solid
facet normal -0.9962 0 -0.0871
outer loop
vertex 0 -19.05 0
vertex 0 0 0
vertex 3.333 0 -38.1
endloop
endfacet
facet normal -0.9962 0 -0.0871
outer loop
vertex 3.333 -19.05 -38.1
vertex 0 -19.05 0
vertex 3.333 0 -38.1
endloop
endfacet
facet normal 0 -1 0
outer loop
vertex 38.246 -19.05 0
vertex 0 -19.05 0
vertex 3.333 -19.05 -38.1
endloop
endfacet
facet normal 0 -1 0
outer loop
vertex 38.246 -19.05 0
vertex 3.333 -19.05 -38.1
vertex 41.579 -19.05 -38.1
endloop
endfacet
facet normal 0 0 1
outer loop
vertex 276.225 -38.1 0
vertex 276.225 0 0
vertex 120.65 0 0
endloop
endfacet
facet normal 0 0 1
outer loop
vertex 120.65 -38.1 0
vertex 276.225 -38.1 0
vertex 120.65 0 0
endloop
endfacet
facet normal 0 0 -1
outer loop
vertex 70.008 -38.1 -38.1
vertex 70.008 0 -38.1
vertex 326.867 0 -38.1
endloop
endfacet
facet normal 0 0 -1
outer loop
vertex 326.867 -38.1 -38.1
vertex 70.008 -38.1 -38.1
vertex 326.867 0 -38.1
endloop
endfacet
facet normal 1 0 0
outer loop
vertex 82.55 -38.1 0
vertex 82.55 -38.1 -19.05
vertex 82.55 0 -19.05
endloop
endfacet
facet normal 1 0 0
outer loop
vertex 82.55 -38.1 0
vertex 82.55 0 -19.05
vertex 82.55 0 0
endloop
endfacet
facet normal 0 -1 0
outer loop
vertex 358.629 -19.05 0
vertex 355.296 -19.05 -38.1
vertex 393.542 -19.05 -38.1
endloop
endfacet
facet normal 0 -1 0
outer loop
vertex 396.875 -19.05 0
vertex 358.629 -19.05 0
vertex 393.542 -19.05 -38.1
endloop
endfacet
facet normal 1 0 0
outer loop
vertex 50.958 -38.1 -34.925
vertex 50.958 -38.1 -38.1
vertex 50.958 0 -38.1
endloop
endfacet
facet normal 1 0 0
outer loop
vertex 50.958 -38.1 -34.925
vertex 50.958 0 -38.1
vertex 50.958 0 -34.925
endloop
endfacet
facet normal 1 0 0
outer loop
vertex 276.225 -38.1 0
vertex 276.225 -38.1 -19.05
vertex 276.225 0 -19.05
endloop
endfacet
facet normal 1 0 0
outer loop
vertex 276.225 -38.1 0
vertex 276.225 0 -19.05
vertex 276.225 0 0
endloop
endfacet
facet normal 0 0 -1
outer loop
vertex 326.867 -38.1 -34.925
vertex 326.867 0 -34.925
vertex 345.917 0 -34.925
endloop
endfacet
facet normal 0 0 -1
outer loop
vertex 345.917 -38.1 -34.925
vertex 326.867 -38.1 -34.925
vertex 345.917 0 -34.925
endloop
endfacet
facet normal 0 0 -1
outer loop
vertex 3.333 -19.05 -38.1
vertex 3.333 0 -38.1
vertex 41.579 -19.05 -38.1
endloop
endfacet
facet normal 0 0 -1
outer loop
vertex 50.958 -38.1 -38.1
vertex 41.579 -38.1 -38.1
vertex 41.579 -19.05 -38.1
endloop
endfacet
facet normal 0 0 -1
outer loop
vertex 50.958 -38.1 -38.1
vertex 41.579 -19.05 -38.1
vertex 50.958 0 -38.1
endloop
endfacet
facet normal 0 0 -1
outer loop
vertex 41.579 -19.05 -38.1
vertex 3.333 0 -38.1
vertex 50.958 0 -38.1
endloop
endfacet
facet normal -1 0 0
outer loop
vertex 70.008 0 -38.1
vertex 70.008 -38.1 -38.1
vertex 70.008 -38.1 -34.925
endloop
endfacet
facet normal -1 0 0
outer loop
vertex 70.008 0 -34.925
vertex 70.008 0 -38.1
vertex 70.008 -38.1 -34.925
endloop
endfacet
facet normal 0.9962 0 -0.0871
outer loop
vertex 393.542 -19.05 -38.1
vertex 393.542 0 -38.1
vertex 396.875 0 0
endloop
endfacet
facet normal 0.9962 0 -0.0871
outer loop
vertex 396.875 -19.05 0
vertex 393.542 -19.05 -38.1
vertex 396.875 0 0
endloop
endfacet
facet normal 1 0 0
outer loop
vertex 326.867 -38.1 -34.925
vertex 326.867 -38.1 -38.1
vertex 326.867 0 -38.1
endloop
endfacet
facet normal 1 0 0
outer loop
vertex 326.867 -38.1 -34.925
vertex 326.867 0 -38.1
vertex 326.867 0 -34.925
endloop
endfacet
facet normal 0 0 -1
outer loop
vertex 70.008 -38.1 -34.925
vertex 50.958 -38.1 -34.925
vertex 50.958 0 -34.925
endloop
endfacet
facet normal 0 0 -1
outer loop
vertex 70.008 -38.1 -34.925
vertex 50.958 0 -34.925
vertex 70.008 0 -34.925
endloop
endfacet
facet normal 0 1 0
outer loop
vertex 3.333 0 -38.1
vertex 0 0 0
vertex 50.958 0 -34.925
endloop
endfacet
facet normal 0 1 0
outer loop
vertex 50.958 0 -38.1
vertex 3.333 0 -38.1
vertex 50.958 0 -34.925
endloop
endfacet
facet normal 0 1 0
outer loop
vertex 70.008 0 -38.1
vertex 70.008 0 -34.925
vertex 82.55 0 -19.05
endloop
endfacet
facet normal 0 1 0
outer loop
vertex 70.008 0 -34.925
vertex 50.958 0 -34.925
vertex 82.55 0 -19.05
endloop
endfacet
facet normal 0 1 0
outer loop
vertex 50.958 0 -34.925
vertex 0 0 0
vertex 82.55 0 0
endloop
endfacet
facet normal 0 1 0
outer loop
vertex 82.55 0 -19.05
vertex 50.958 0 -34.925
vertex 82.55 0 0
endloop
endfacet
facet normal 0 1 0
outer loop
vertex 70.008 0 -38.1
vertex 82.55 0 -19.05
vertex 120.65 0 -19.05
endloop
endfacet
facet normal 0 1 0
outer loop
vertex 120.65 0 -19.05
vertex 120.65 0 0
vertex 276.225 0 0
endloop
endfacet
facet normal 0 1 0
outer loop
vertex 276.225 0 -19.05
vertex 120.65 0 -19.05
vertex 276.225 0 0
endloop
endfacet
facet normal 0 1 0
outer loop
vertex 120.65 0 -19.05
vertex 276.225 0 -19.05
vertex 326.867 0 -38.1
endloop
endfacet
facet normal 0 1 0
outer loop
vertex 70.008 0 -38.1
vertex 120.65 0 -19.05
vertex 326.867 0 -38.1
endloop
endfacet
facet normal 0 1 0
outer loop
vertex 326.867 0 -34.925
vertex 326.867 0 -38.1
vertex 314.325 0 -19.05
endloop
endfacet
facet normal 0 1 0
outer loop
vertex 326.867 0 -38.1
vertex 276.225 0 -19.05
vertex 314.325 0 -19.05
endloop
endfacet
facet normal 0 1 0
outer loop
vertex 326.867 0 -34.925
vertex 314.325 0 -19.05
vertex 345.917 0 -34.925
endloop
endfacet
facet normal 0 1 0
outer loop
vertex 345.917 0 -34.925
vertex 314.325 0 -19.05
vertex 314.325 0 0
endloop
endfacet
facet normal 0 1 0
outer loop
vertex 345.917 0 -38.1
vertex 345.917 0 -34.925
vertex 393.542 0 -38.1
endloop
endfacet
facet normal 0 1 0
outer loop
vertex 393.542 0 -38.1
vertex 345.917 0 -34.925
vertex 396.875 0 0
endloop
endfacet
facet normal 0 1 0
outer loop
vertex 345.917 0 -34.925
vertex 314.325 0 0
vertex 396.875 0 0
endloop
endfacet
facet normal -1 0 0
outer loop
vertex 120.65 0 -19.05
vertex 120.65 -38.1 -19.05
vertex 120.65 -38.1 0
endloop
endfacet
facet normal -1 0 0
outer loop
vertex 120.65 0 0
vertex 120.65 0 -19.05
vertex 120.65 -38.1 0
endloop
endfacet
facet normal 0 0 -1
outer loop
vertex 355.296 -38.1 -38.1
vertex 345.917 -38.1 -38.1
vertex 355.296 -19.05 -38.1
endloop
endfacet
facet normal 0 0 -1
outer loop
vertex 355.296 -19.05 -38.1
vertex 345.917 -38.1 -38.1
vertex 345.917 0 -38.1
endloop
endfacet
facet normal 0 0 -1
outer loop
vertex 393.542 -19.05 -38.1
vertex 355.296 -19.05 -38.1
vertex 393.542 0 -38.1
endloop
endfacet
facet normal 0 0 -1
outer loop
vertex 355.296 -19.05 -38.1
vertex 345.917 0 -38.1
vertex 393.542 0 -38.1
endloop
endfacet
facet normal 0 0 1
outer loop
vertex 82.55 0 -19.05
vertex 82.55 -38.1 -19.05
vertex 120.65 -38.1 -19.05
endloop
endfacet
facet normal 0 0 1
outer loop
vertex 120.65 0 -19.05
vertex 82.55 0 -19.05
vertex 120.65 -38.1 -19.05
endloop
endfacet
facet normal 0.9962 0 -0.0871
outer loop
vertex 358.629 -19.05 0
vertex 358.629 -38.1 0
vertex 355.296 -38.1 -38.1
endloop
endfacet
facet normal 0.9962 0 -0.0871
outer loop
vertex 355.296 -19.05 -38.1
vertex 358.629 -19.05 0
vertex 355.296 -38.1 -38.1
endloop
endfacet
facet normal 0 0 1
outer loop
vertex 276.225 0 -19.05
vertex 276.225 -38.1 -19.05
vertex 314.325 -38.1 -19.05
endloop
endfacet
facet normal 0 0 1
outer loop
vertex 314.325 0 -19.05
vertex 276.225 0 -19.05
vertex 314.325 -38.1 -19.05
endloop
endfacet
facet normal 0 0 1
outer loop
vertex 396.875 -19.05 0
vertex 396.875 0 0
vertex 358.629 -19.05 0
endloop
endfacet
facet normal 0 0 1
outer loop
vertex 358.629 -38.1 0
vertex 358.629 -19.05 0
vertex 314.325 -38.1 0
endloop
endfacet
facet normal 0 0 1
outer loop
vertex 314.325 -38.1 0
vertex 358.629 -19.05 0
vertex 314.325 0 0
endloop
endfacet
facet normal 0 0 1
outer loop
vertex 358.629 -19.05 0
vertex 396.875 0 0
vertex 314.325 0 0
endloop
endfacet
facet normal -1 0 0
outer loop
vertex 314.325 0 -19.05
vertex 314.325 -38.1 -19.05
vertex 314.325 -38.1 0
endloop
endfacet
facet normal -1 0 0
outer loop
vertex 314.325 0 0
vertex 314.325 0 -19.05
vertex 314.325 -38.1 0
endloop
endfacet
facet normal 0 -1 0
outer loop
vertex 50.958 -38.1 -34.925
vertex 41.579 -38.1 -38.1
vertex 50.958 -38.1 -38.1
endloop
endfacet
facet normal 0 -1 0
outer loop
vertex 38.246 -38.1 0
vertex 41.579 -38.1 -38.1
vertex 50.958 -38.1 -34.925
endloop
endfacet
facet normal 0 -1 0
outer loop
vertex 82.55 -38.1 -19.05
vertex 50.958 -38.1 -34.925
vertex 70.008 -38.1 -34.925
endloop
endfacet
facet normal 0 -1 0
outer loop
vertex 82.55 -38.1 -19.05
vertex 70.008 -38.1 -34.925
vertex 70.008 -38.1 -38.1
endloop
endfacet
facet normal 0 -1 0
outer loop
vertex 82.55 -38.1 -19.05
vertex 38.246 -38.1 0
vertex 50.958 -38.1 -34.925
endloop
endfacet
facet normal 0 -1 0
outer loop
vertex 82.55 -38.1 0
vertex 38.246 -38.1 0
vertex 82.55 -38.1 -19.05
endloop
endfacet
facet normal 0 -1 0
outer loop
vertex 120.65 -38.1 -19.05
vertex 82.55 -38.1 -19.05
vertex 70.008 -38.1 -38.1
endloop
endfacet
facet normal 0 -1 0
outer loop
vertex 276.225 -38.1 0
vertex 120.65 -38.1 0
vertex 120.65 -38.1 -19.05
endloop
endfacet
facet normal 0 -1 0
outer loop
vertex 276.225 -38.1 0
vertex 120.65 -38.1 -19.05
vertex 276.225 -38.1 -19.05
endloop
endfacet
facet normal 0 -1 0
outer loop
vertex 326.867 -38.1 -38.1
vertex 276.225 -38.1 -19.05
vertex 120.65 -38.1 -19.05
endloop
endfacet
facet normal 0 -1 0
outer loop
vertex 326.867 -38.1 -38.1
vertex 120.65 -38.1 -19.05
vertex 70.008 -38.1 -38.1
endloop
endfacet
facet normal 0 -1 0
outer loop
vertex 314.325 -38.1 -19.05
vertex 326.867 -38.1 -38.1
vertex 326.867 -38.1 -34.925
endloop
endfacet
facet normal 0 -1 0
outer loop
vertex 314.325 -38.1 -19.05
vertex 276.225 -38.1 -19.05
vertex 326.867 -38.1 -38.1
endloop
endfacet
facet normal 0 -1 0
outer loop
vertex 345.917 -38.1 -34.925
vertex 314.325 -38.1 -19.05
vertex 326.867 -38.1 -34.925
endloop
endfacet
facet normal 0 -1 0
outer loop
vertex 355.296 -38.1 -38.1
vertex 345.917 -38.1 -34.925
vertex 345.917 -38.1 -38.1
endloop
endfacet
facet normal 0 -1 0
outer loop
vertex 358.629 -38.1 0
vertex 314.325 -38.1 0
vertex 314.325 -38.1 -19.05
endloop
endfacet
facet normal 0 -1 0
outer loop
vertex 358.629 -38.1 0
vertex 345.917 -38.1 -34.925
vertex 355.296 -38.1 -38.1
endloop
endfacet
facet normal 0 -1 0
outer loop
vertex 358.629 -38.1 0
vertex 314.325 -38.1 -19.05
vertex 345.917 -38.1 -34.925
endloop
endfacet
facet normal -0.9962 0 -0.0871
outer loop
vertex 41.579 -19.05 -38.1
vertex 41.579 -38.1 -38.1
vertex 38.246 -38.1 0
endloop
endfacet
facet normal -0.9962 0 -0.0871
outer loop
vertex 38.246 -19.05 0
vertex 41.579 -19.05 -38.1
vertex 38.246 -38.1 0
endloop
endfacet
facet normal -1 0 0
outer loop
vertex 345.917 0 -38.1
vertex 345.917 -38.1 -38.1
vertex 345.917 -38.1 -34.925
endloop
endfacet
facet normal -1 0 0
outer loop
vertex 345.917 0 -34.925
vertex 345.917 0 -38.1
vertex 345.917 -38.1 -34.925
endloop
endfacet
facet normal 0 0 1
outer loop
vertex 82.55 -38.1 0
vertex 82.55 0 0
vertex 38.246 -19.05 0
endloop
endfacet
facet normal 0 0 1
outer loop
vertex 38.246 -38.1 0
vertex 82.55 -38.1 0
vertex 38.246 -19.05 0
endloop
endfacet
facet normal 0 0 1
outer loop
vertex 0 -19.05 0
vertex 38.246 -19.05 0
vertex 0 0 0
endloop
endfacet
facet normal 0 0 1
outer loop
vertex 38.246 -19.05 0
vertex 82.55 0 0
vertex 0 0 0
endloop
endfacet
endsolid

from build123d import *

# Parameters (mm, degrees)
F1_DEPTH  = 38.1
F3_DEPTH  = 19.05
F5_DEPTH  = 19.05
F6_W      = 38.1
F6_H      = 19.05
F7_DEPTH  = 38.1
F8_W      = 19.05
F8_H      = 3.175
F9_DEPTH  = 38.1
F10_W     = 19.05
F10_H     = 3.175
F11_DEPTH = 38.1
F12_W     = 38.1
F12_H     = 19.05
F13_DEPTH = 38.1


with BuildPart() as f1:
    # F0 (on Front) → F1 (new body)
    with BuildSketch(Plane.XZ):
        Polygon((396.875, 0), (0, 0), (3.333318, -38.1), (393.541682, -38.1), align=None)
    extrude(amount=F1_DEPTH)

    # F2 (on face) → F3 (cut)
    with BuildSketch(Plane.XZ.offset(38.1)):
        Polygon((396.875, 0), (358.629464, 0), (355.296146, -38.1), (393.541682, -38.1), align=None)
    extrude(amount=-F3_DEPTH, mode=Mode.SUBTRACT)

    # F4 (on face) → F5 (cut)
    with BuildSketch(Plane.XZ.offset(38.1)):
        Polygon((41.578854, -38.1), (38.245536, 0), (0, 0), (3.333318, -38.1), align=None)
    extrude(amount=-F5_DEPTH, mode=Mode.SUBTRACT)

    # F6 (on face) → F7 (cut)
    with BuildSketch(Plane.XZ.offset(38.1)):
        with Locations((295.275, -9.525)):
            Rectangle(F6_W, F6_H)
    extrude(amount=-F7_DEPTH, mode=Mode.SUBTRACT)

    # F8 (on face) → F9 (cut)
    with BuildSketch(Plane.XZ.offset(38.1)):
        with Locations((60.483318, -36.5125)):
            Rectangle(F8_W, F8_H)
    extrude(amount=-F9_DEPTH, mode=Mode.SUBTRACT)

    # F10 (on face) → F11 (cut)
    with BuildSketch(Plane.XZ.offset(38.1)):
        with Locations((336.391682, -36.5125)):
            Rectangle(F10_W, F10_H)
    extrude(amount=-F11_DEPTH, mode=Mode.SUBTRACT)

    # F12 (on face) → F13 (cut)
    with BuildSketch(Plane.XZ.offset(38.1)):
        with Locations((101.6, -9.525)):
            Rectangle(F12_W, F12_H)
    extrude(amount=-F13_DEPTH, mode=Mode.SUBTRACT)


solid = f1.part
